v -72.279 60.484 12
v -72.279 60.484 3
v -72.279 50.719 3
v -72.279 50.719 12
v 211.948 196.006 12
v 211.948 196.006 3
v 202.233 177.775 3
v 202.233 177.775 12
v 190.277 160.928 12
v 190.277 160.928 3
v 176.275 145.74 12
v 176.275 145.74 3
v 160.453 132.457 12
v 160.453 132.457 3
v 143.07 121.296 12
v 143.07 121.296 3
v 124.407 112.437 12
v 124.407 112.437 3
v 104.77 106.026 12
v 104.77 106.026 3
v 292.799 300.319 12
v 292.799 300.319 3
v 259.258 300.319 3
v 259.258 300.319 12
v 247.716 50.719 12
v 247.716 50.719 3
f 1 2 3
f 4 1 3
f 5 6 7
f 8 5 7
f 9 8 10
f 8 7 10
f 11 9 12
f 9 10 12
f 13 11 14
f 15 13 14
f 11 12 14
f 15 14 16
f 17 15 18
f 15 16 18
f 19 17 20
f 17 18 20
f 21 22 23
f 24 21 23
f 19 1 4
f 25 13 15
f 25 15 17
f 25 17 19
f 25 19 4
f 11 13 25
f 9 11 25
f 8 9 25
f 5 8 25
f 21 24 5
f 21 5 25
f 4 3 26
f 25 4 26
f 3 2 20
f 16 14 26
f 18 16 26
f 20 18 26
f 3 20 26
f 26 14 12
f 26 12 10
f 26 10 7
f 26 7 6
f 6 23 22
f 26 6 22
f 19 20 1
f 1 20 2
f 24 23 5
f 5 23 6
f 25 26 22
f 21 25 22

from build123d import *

# Parameters (mm, degrees)
BOSS_EXTRUDE1_DEPTH     = 15
CUT_EXTRUDE1_DEPTH      = 576.044354215
CUT_EXTRUDE1_DEPTH_BACK = 576.044354215
SCALE1_SCALE            = 0.6


with BuildPart() as part:
    # Sketch1 → Boss-Extrude1 (new body)
    with BuildSketch(Plane.XY):
        with BuildLine():
            Line((-236.729376996, 0), (0, 0))
            Line((0, 0), (357.876847169, 0))
            Line((357.876847169, 0), (396.730398779, 416))
            Line((396.730398779, 416), (315.832809595, 416))
            Line((315.832809595, 416), (236.983089551, 242.144494596))
            ThreePointArc((236.983089551, 242.144494596), (164.696190822, 146.877858304), (58.352308735, 92.177707838))
            Line((58.352308735, 92.177707838), (-236.729376996, 16.274880501))
            Line((-236.729376996, 16.274880501), (-236.729376996, 0))
        make_face()
    extrude(amount=BOSS_EXTRUDE1_DEPTH)

    # Sketch2 → Cut-Extrude1 (cut, two sides: drawn at the far end of the back side and taken through both)
    with BuildSketch(Plane.XY.offset(15).offset(-CUT_EXTRUDE1_DEPTH_BACK)):
        Polygon((396.730398779, 416), (357.876847169, 0), (296.597151769, 0), (371.734942748, 416), align=None)
    extrude(amount=CUT_EXTRUDE1_DEPTH + CUT_EXTRUDE1_DEPTH_BACK, mode=Mode.SUBTRACT)


with BuildPart() as part_1:
    # Scale1: scaled about (174.395350586, 126.79859987, 7.5)
    add(part.part.scale(SCALE1_SCALE).moved(Location((69.758140234, 50.719439948, 3))))


solid = part_1.part
